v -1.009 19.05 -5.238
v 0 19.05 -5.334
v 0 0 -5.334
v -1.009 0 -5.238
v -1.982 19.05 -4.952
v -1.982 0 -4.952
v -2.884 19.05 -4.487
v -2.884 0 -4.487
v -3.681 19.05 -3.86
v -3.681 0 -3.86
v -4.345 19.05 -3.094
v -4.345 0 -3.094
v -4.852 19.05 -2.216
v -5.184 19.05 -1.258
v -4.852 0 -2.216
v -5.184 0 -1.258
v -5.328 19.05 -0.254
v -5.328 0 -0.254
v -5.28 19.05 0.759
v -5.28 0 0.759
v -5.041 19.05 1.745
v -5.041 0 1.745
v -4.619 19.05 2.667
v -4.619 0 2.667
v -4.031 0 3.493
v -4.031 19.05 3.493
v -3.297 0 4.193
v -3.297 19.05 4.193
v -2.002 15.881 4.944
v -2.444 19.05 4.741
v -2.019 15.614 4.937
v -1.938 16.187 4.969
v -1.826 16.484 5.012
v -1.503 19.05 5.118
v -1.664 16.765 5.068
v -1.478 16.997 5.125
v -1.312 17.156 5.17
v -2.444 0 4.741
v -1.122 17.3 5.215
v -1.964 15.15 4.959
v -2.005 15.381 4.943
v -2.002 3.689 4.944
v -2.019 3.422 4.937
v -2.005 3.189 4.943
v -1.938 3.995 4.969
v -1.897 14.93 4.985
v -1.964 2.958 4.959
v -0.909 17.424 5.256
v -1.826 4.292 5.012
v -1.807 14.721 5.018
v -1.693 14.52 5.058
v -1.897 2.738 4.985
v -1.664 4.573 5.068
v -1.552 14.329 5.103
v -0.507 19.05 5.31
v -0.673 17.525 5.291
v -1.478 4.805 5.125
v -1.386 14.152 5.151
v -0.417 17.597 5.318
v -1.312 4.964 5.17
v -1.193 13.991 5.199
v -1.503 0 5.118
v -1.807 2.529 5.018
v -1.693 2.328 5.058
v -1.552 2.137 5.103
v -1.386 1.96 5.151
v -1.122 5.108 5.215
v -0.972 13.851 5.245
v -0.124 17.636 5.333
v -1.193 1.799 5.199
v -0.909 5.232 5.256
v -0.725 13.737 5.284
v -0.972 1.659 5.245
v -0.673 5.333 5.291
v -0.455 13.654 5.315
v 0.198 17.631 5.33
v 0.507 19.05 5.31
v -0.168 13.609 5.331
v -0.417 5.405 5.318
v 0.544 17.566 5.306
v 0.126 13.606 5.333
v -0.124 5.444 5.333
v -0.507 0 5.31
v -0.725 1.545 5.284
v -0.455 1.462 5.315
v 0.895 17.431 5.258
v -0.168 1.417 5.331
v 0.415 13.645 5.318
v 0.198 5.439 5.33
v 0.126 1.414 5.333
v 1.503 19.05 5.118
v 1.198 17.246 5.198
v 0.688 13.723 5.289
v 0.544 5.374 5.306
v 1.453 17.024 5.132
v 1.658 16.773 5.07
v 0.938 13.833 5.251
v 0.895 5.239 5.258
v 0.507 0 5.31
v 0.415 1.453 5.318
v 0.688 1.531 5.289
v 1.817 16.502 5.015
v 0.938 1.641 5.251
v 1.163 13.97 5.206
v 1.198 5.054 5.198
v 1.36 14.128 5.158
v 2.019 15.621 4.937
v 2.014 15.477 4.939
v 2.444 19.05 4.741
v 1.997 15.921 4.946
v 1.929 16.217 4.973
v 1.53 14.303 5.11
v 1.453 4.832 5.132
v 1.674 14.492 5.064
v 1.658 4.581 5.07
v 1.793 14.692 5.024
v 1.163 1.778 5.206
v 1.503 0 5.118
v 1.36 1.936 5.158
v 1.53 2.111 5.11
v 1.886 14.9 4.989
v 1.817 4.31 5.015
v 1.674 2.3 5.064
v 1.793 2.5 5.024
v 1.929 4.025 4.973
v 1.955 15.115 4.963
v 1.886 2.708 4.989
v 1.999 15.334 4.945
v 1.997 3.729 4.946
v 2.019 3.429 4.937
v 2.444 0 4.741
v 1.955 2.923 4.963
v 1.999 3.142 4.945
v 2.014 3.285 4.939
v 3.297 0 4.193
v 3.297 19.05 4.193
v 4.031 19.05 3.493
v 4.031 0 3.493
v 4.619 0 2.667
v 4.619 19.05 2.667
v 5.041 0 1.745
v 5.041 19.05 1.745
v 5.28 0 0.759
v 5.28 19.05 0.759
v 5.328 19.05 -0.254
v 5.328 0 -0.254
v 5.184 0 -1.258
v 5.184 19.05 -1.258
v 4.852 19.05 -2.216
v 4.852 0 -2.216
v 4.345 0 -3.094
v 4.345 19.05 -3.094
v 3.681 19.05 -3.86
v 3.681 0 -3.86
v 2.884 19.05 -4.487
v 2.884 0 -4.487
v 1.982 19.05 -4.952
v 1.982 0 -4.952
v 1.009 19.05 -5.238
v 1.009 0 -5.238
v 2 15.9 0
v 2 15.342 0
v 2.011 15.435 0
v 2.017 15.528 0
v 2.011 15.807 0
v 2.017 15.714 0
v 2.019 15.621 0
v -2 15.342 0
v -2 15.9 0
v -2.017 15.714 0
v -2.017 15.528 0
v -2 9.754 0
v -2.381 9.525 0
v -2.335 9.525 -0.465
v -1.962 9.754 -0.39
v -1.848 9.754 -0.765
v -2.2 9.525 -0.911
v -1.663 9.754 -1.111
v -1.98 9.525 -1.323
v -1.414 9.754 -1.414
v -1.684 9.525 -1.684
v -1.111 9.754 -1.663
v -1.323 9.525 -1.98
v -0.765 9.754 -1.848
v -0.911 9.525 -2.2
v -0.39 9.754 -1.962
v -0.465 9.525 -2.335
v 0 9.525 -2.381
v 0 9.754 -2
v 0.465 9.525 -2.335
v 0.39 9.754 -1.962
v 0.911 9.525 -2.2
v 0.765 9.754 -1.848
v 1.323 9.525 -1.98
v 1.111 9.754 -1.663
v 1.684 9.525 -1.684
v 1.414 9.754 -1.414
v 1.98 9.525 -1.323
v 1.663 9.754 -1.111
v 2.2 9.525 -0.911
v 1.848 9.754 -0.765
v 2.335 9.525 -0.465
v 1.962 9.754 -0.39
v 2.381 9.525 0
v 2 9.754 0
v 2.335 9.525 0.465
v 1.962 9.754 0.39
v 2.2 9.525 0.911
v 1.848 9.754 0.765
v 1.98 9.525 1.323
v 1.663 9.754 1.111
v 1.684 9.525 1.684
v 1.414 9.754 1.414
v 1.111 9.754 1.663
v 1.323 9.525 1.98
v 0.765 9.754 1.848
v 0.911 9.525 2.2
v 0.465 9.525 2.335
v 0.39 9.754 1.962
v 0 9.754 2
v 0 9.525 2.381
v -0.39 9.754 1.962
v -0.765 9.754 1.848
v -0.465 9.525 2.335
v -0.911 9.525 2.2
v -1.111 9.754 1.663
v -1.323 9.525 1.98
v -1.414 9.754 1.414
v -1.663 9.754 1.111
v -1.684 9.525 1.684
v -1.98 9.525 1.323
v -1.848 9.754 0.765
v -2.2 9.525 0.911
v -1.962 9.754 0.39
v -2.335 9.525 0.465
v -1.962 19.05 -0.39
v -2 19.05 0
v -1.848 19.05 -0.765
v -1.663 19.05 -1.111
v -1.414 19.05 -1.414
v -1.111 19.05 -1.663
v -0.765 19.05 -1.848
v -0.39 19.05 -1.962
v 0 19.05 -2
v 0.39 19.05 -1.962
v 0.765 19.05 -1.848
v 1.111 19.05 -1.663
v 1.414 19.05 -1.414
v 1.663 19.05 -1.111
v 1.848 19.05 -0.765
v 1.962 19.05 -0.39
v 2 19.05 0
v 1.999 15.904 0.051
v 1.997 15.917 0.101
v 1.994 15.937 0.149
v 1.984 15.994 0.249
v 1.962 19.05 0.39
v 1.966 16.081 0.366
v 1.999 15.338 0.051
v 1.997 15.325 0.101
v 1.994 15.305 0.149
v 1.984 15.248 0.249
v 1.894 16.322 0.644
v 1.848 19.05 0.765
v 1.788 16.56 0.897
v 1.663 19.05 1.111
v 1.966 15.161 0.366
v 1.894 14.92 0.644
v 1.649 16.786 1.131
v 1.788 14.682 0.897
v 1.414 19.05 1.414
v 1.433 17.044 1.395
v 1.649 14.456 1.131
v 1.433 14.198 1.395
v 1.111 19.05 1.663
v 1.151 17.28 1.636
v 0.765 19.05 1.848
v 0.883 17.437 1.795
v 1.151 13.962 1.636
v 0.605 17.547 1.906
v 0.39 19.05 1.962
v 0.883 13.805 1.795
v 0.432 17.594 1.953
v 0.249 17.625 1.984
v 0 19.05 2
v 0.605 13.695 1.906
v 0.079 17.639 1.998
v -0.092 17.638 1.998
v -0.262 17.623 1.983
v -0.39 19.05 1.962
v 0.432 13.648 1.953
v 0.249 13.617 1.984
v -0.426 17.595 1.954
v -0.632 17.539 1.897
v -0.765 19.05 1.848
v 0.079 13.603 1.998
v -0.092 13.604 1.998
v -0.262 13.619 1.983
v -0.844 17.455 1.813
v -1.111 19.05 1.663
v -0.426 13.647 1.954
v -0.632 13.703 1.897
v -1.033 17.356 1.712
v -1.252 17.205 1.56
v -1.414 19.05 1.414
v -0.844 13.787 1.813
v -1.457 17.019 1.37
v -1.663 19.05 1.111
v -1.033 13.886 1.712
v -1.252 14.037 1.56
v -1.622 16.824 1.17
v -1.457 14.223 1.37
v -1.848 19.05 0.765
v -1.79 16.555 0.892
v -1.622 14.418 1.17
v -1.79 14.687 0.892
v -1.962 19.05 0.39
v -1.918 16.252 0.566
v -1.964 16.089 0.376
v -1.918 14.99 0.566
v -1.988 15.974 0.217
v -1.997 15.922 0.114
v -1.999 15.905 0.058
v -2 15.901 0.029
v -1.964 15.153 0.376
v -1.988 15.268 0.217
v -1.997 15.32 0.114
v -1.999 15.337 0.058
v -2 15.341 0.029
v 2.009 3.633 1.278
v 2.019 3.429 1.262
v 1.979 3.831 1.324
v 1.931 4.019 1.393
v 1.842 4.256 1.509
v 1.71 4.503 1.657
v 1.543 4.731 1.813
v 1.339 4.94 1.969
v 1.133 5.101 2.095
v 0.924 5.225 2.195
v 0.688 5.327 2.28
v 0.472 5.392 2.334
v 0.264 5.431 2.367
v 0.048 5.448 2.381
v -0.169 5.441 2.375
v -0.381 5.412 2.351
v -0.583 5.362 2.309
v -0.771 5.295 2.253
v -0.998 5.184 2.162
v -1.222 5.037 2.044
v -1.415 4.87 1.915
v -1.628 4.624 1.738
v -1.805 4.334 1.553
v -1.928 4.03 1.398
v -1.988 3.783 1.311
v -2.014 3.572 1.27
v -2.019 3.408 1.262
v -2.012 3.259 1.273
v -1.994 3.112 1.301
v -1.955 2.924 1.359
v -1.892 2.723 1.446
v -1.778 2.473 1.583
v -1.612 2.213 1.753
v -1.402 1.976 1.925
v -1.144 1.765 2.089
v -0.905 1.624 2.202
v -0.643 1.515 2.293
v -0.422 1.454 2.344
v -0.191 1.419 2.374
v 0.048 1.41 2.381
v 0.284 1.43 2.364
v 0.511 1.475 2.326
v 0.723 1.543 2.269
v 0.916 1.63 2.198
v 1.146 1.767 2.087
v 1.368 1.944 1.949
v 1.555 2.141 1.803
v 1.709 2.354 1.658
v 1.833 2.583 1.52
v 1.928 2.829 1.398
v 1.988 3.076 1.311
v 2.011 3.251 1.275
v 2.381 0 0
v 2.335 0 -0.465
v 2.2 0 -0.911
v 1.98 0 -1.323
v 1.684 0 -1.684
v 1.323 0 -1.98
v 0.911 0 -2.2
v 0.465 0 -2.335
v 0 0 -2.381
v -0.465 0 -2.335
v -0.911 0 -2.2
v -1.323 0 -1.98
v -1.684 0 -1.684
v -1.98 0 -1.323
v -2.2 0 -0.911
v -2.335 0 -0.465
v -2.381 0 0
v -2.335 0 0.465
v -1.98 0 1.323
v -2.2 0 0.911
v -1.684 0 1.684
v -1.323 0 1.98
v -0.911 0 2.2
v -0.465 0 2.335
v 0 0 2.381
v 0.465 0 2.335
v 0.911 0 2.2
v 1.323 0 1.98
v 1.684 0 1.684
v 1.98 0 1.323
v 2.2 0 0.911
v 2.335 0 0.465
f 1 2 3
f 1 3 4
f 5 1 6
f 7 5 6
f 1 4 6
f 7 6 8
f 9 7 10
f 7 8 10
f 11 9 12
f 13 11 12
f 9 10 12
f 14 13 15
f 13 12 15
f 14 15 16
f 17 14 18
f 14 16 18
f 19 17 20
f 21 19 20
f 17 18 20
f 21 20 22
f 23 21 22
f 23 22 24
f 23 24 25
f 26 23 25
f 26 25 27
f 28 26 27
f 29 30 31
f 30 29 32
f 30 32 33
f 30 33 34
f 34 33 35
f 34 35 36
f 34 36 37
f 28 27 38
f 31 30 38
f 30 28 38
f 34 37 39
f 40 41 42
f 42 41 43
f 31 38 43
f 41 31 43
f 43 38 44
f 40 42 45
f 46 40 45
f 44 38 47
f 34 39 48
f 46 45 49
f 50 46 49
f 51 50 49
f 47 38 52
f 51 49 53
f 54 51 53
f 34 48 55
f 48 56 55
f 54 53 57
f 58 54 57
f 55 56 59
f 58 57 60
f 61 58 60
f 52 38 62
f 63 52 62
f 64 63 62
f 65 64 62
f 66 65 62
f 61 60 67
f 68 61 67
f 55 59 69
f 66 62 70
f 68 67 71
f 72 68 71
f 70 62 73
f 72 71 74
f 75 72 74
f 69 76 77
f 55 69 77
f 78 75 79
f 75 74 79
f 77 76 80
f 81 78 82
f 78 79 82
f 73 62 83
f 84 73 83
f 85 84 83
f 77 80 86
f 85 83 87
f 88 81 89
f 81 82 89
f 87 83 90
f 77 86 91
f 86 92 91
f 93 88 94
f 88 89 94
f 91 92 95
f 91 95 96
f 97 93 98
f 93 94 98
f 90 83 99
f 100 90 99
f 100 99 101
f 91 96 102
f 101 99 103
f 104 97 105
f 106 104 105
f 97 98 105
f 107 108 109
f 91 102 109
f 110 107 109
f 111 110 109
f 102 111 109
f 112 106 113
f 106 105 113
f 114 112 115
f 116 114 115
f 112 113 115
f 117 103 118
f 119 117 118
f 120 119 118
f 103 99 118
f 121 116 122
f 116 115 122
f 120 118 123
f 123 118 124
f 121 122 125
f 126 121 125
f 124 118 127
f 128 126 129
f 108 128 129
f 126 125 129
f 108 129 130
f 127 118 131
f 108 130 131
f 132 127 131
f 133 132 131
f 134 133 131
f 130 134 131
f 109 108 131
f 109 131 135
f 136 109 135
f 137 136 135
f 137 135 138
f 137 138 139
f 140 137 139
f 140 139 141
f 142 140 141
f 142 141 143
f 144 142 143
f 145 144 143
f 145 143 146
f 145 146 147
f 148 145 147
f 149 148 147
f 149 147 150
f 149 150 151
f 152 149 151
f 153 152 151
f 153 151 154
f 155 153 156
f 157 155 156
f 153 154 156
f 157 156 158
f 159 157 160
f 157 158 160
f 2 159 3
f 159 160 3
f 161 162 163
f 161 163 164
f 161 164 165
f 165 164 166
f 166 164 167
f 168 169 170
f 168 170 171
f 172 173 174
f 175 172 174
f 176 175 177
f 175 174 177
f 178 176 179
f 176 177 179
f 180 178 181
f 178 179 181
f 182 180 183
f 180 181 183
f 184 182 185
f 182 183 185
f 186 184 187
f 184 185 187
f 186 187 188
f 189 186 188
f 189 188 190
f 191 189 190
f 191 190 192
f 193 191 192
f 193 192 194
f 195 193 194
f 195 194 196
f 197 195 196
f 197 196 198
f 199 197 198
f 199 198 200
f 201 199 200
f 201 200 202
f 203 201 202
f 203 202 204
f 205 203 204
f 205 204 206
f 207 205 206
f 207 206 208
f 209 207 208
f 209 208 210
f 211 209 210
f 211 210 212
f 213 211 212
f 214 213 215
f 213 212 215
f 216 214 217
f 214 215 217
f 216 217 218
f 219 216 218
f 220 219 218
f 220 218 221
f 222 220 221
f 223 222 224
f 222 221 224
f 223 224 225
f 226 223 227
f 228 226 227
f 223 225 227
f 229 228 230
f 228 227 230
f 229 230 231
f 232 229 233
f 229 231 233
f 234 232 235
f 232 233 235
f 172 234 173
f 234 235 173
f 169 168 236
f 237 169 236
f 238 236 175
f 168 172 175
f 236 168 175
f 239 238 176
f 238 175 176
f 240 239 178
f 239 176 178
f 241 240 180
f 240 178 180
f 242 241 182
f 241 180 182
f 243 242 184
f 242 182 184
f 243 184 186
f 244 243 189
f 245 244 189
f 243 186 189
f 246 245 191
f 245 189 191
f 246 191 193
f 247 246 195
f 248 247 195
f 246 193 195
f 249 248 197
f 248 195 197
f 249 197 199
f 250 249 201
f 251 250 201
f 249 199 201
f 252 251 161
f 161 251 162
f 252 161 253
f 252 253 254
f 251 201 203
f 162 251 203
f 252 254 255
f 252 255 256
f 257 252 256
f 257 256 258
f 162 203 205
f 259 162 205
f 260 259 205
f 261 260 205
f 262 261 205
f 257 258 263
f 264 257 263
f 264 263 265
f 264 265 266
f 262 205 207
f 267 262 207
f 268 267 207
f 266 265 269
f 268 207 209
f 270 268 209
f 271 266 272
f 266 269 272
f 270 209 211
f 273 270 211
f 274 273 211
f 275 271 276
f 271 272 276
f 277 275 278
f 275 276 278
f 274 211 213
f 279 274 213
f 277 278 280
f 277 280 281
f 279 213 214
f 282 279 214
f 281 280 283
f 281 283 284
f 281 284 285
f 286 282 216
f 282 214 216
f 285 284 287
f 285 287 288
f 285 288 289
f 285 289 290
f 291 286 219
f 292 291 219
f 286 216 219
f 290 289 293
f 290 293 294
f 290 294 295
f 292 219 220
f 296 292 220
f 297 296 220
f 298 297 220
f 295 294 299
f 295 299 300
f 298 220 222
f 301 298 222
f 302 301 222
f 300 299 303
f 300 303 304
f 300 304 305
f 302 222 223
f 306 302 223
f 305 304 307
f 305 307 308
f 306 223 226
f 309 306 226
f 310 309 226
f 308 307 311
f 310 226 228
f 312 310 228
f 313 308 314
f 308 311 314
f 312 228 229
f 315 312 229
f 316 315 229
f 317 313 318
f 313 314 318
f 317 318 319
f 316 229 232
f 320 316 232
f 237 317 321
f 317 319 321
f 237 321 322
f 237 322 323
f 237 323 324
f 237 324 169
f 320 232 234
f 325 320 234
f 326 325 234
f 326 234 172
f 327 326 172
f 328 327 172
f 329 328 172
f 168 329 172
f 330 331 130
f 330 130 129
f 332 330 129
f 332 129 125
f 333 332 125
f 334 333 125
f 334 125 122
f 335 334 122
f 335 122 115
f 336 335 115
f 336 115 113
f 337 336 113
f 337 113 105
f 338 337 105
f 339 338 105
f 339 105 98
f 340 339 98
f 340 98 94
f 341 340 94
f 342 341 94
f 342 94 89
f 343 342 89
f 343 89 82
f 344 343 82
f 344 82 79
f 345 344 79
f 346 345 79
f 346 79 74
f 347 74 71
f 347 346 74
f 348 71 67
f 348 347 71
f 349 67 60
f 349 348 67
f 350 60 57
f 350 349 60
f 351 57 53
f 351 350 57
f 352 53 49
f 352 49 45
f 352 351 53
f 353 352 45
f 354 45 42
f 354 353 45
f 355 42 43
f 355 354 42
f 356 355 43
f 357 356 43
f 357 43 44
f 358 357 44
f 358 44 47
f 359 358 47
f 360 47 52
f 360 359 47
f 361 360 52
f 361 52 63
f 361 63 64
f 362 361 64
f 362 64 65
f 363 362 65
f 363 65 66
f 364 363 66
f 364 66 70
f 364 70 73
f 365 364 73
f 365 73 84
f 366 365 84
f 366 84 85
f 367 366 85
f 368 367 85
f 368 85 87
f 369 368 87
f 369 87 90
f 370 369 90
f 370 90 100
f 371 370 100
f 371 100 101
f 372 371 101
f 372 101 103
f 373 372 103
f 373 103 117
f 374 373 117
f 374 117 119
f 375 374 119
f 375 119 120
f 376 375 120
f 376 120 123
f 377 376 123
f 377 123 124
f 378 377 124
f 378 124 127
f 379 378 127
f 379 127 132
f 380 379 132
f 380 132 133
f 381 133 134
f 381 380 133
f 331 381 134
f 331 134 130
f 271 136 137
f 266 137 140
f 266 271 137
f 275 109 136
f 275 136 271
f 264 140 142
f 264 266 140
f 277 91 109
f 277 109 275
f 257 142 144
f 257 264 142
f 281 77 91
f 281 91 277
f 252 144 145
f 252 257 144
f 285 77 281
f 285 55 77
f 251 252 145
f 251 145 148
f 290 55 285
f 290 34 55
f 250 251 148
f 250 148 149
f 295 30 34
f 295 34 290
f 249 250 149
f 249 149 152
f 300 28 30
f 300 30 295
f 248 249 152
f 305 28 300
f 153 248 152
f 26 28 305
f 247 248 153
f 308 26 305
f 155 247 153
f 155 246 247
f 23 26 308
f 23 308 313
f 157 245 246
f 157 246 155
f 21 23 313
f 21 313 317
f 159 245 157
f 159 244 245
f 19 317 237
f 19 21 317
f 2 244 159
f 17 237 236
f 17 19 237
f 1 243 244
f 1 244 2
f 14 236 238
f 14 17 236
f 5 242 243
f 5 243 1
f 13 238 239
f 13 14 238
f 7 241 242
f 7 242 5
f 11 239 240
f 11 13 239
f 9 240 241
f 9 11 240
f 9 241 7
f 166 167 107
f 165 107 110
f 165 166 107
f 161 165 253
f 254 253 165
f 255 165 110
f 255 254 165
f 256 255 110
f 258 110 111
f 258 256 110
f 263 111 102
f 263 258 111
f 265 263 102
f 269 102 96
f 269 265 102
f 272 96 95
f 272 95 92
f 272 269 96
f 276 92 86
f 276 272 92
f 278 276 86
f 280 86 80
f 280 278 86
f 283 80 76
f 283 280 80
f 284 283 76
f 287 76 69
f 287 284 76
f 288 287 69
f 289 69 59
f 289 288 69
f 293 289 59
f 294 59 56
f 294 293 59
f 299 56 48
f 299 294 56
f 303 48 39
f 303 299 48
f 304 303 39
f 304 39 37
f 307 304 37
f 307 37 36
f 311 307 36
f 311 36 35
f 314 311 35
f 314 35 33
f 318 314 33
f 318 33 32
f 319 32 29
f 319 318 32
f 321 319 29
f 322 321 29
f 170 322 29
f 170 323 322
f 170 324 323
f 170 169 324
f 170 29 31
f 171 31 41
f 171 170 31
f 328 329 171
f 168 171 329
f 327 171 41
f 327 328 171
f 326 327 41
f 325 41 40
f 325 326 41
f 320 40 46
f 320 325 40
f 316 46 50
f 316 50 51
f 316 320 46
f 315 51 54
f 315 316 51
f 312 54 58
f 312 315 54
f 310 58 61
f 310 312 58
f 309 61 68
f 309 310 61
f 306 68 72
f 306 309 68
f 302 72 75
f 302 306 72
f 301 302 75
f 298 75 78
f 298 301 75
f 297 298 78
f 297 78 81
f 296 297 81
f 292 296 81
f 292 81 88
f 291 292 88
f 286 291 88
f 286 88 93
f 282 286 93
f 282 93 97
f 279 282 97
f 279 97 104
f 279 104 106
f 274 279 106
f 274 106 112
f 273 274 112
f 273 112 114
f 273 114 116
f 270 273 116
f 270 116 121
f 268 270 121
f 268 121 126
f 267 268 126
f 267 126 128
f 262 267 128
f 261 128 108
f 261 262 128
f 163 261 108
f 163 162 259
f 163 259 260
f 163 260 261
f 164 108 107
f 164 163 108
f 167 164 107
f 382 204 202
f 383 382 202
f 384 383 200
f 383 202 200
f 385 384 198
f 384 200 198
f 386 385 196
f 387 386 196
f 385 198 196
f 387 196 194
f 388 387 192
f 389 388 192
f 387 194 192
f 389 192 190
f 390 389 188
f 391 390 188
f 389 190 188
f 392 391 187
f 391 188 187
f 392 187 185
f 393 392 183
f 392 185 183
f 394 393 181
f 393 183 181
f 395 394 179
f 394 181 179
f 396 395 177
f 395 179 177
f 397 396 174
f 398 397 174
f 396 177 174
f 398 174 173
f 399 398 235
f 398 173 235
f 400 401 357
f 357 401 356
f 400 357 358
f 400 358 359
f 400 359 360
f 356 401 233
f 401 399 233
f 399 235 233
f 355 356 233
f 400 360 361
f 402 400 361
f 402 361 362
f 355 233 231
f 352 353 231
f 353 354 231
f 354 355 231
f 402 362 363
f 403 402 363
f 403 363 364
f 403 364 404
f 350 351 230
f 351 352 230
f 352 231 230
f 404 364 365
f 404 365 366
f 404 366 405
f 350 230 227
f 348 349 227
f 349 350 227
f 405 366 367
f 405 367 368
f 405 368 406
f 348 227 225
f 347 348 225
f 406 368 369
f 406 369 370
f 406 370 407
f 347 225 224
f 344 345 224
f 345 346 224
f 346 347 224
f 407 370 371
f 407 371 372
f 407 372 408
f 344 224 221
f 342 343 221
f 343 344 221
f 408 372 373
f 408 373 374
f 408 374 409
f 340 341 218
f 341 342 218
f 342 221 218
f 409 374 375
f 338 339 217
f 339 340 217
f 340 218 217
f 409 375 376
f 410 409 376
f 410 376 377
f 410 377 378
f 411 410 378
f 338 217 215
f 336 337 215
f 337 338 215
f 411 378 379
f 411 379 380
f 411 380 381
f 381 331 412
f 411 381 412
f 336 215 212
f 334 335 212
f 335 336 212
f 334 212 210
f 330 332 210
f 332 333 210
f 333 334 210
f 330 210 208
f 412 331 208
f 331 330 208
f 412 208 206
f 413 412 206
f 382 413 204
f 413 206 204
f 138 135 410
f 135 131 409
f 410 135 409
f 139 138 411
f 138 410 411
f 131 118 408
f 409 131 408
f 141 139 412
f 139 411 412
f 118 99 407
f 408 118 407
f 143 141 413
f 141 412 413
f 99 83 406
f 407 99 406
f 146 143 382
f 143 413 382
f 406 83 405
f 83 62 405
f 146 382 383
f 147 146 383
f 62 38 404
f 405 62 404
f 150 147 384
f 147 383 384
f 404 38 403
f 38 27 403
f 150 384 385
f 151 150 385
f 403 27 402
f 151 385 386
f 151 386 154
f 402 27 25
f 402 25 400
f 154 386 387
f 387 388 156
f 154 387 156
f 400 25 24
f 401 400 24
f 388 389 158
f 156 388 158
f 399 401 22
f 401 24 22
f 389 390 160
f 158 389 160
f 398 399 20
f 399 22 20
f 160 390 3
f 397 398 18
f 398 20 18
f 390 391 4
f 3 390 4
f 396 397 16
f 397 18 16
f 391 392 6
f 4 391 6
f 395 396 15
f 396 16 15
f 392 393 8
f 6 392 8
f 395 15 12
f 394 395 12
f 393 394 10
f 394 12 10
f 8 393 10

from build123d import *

# Parameters (mm, degrees)
SKETCH1_R                       = 5.334
BOSS_EXTRUDE1_DEPTH             = 19.05
F_4_0MM_DOWEL_HOLE2_D           = 4
F_4_0MM_DOWEL_HOLE2_DEPTH       = 9.525
F_4_0MM_DOWEL_HOLE2_TIP         = 1.201721238
F_3_16_0_1875_DOWEL_HOLE1_D     = 4.7625
F_3_16_0_1875_DOWEL_HOLE1_DEPTH = 9.525
F_3_16_0_1875_DOWEL_HOLE1_TIP   = 1.430799349
F_10_32_TAPPED_HOLE1_OUTLINE_R  = 2.0193
F_10_32_TAPPED_HOLE1_DEPTH      = 6


with BuildPart() as part:
    # Sketch1 → Boss-Extrude1 (new body)
    with BuildSketch(Plane(origin=(0, 0, 0), x_dir=(1, 0, 0), z_dir=(0, 1, 0))):
        with Locations(Location((0, 0, 0), (0, 0, 90))):
            Circle(SKETCH1_R)
    extrude(amount=BOSS_EXTRUDE1_DEPTH)

    # Ø4.0mm Dowel Hole2
    with Locations(Plane(origin=(0, 19.05, 0), x_dir=(1, 0, 0), z_dir=(0, 1, 0))):
        with Locations((0, 0)):
            Hole(F_4_0MM_DOWEL_HOLE2_D / 2, depth=F_4_0MM_DOWEL_HOLE2_DEPTH)
            with Locations((0, 0, -(F_4_0MM_DOWEL_HOLE2_DEPTH + F_4_0MM_DOWEL_HOLE2_TIP / 2))):  # 118° drill point
                Cone(0, F_4_0MM_DOWEL_HOLE2_D / 2, F_4_0MM_DOWEL_HOLE2_TIP, mode=Mode.SUBTRACT)

    # 3/16 (0.1875) Dowel Hole1
    with Locations(Plane(origin=(0, 0, 0), x_dir=(-1, 0, 0), z_dir=(0, -1, 0))):
        with Locations((0, 0)):
            Hole(F_3_16_0_1875_DOWEL_HOLE1_D / 2, depth=F_3_16_0_1875_DOWEL_HOLE1_DEPTH)
            with Locations((0, 0, -(F_3_16_0_1875_DOWEL_HOLE1_DEPTH + F_3_16_0_1875_DOWEL_HOLE1_TIP / 2))):  # 118° drill point
                Cone(0, F_3_16_0_1875_DOWEL_HOLE1_D / 2, F_3_16_0_1875_DOWEL_HOLE1_TIP, mode=Mode.SUBTRACT)

    # #10-32 Tapped Hole1: read off the stored shape, not the designer's step
    # #10-32 Tapped Hole1 outline → #10-32 Tapped Hole1 (cut)
    with BuildSketch(Plane.XY):
        with Locations((0, 3.429)):
            Circle(F_10_32_TAPPED_HOLE1_OUTLINE_R)
        with Locations((0, 15.621)):
            Circle(F_10_32_TAPPED_HOLE1_OUTLINE_R)
    extrude(amount=F_10_32_TAPPED_HOLE1_DEPTH, mode=Mode.SUBTRACT)


solid = part.part
